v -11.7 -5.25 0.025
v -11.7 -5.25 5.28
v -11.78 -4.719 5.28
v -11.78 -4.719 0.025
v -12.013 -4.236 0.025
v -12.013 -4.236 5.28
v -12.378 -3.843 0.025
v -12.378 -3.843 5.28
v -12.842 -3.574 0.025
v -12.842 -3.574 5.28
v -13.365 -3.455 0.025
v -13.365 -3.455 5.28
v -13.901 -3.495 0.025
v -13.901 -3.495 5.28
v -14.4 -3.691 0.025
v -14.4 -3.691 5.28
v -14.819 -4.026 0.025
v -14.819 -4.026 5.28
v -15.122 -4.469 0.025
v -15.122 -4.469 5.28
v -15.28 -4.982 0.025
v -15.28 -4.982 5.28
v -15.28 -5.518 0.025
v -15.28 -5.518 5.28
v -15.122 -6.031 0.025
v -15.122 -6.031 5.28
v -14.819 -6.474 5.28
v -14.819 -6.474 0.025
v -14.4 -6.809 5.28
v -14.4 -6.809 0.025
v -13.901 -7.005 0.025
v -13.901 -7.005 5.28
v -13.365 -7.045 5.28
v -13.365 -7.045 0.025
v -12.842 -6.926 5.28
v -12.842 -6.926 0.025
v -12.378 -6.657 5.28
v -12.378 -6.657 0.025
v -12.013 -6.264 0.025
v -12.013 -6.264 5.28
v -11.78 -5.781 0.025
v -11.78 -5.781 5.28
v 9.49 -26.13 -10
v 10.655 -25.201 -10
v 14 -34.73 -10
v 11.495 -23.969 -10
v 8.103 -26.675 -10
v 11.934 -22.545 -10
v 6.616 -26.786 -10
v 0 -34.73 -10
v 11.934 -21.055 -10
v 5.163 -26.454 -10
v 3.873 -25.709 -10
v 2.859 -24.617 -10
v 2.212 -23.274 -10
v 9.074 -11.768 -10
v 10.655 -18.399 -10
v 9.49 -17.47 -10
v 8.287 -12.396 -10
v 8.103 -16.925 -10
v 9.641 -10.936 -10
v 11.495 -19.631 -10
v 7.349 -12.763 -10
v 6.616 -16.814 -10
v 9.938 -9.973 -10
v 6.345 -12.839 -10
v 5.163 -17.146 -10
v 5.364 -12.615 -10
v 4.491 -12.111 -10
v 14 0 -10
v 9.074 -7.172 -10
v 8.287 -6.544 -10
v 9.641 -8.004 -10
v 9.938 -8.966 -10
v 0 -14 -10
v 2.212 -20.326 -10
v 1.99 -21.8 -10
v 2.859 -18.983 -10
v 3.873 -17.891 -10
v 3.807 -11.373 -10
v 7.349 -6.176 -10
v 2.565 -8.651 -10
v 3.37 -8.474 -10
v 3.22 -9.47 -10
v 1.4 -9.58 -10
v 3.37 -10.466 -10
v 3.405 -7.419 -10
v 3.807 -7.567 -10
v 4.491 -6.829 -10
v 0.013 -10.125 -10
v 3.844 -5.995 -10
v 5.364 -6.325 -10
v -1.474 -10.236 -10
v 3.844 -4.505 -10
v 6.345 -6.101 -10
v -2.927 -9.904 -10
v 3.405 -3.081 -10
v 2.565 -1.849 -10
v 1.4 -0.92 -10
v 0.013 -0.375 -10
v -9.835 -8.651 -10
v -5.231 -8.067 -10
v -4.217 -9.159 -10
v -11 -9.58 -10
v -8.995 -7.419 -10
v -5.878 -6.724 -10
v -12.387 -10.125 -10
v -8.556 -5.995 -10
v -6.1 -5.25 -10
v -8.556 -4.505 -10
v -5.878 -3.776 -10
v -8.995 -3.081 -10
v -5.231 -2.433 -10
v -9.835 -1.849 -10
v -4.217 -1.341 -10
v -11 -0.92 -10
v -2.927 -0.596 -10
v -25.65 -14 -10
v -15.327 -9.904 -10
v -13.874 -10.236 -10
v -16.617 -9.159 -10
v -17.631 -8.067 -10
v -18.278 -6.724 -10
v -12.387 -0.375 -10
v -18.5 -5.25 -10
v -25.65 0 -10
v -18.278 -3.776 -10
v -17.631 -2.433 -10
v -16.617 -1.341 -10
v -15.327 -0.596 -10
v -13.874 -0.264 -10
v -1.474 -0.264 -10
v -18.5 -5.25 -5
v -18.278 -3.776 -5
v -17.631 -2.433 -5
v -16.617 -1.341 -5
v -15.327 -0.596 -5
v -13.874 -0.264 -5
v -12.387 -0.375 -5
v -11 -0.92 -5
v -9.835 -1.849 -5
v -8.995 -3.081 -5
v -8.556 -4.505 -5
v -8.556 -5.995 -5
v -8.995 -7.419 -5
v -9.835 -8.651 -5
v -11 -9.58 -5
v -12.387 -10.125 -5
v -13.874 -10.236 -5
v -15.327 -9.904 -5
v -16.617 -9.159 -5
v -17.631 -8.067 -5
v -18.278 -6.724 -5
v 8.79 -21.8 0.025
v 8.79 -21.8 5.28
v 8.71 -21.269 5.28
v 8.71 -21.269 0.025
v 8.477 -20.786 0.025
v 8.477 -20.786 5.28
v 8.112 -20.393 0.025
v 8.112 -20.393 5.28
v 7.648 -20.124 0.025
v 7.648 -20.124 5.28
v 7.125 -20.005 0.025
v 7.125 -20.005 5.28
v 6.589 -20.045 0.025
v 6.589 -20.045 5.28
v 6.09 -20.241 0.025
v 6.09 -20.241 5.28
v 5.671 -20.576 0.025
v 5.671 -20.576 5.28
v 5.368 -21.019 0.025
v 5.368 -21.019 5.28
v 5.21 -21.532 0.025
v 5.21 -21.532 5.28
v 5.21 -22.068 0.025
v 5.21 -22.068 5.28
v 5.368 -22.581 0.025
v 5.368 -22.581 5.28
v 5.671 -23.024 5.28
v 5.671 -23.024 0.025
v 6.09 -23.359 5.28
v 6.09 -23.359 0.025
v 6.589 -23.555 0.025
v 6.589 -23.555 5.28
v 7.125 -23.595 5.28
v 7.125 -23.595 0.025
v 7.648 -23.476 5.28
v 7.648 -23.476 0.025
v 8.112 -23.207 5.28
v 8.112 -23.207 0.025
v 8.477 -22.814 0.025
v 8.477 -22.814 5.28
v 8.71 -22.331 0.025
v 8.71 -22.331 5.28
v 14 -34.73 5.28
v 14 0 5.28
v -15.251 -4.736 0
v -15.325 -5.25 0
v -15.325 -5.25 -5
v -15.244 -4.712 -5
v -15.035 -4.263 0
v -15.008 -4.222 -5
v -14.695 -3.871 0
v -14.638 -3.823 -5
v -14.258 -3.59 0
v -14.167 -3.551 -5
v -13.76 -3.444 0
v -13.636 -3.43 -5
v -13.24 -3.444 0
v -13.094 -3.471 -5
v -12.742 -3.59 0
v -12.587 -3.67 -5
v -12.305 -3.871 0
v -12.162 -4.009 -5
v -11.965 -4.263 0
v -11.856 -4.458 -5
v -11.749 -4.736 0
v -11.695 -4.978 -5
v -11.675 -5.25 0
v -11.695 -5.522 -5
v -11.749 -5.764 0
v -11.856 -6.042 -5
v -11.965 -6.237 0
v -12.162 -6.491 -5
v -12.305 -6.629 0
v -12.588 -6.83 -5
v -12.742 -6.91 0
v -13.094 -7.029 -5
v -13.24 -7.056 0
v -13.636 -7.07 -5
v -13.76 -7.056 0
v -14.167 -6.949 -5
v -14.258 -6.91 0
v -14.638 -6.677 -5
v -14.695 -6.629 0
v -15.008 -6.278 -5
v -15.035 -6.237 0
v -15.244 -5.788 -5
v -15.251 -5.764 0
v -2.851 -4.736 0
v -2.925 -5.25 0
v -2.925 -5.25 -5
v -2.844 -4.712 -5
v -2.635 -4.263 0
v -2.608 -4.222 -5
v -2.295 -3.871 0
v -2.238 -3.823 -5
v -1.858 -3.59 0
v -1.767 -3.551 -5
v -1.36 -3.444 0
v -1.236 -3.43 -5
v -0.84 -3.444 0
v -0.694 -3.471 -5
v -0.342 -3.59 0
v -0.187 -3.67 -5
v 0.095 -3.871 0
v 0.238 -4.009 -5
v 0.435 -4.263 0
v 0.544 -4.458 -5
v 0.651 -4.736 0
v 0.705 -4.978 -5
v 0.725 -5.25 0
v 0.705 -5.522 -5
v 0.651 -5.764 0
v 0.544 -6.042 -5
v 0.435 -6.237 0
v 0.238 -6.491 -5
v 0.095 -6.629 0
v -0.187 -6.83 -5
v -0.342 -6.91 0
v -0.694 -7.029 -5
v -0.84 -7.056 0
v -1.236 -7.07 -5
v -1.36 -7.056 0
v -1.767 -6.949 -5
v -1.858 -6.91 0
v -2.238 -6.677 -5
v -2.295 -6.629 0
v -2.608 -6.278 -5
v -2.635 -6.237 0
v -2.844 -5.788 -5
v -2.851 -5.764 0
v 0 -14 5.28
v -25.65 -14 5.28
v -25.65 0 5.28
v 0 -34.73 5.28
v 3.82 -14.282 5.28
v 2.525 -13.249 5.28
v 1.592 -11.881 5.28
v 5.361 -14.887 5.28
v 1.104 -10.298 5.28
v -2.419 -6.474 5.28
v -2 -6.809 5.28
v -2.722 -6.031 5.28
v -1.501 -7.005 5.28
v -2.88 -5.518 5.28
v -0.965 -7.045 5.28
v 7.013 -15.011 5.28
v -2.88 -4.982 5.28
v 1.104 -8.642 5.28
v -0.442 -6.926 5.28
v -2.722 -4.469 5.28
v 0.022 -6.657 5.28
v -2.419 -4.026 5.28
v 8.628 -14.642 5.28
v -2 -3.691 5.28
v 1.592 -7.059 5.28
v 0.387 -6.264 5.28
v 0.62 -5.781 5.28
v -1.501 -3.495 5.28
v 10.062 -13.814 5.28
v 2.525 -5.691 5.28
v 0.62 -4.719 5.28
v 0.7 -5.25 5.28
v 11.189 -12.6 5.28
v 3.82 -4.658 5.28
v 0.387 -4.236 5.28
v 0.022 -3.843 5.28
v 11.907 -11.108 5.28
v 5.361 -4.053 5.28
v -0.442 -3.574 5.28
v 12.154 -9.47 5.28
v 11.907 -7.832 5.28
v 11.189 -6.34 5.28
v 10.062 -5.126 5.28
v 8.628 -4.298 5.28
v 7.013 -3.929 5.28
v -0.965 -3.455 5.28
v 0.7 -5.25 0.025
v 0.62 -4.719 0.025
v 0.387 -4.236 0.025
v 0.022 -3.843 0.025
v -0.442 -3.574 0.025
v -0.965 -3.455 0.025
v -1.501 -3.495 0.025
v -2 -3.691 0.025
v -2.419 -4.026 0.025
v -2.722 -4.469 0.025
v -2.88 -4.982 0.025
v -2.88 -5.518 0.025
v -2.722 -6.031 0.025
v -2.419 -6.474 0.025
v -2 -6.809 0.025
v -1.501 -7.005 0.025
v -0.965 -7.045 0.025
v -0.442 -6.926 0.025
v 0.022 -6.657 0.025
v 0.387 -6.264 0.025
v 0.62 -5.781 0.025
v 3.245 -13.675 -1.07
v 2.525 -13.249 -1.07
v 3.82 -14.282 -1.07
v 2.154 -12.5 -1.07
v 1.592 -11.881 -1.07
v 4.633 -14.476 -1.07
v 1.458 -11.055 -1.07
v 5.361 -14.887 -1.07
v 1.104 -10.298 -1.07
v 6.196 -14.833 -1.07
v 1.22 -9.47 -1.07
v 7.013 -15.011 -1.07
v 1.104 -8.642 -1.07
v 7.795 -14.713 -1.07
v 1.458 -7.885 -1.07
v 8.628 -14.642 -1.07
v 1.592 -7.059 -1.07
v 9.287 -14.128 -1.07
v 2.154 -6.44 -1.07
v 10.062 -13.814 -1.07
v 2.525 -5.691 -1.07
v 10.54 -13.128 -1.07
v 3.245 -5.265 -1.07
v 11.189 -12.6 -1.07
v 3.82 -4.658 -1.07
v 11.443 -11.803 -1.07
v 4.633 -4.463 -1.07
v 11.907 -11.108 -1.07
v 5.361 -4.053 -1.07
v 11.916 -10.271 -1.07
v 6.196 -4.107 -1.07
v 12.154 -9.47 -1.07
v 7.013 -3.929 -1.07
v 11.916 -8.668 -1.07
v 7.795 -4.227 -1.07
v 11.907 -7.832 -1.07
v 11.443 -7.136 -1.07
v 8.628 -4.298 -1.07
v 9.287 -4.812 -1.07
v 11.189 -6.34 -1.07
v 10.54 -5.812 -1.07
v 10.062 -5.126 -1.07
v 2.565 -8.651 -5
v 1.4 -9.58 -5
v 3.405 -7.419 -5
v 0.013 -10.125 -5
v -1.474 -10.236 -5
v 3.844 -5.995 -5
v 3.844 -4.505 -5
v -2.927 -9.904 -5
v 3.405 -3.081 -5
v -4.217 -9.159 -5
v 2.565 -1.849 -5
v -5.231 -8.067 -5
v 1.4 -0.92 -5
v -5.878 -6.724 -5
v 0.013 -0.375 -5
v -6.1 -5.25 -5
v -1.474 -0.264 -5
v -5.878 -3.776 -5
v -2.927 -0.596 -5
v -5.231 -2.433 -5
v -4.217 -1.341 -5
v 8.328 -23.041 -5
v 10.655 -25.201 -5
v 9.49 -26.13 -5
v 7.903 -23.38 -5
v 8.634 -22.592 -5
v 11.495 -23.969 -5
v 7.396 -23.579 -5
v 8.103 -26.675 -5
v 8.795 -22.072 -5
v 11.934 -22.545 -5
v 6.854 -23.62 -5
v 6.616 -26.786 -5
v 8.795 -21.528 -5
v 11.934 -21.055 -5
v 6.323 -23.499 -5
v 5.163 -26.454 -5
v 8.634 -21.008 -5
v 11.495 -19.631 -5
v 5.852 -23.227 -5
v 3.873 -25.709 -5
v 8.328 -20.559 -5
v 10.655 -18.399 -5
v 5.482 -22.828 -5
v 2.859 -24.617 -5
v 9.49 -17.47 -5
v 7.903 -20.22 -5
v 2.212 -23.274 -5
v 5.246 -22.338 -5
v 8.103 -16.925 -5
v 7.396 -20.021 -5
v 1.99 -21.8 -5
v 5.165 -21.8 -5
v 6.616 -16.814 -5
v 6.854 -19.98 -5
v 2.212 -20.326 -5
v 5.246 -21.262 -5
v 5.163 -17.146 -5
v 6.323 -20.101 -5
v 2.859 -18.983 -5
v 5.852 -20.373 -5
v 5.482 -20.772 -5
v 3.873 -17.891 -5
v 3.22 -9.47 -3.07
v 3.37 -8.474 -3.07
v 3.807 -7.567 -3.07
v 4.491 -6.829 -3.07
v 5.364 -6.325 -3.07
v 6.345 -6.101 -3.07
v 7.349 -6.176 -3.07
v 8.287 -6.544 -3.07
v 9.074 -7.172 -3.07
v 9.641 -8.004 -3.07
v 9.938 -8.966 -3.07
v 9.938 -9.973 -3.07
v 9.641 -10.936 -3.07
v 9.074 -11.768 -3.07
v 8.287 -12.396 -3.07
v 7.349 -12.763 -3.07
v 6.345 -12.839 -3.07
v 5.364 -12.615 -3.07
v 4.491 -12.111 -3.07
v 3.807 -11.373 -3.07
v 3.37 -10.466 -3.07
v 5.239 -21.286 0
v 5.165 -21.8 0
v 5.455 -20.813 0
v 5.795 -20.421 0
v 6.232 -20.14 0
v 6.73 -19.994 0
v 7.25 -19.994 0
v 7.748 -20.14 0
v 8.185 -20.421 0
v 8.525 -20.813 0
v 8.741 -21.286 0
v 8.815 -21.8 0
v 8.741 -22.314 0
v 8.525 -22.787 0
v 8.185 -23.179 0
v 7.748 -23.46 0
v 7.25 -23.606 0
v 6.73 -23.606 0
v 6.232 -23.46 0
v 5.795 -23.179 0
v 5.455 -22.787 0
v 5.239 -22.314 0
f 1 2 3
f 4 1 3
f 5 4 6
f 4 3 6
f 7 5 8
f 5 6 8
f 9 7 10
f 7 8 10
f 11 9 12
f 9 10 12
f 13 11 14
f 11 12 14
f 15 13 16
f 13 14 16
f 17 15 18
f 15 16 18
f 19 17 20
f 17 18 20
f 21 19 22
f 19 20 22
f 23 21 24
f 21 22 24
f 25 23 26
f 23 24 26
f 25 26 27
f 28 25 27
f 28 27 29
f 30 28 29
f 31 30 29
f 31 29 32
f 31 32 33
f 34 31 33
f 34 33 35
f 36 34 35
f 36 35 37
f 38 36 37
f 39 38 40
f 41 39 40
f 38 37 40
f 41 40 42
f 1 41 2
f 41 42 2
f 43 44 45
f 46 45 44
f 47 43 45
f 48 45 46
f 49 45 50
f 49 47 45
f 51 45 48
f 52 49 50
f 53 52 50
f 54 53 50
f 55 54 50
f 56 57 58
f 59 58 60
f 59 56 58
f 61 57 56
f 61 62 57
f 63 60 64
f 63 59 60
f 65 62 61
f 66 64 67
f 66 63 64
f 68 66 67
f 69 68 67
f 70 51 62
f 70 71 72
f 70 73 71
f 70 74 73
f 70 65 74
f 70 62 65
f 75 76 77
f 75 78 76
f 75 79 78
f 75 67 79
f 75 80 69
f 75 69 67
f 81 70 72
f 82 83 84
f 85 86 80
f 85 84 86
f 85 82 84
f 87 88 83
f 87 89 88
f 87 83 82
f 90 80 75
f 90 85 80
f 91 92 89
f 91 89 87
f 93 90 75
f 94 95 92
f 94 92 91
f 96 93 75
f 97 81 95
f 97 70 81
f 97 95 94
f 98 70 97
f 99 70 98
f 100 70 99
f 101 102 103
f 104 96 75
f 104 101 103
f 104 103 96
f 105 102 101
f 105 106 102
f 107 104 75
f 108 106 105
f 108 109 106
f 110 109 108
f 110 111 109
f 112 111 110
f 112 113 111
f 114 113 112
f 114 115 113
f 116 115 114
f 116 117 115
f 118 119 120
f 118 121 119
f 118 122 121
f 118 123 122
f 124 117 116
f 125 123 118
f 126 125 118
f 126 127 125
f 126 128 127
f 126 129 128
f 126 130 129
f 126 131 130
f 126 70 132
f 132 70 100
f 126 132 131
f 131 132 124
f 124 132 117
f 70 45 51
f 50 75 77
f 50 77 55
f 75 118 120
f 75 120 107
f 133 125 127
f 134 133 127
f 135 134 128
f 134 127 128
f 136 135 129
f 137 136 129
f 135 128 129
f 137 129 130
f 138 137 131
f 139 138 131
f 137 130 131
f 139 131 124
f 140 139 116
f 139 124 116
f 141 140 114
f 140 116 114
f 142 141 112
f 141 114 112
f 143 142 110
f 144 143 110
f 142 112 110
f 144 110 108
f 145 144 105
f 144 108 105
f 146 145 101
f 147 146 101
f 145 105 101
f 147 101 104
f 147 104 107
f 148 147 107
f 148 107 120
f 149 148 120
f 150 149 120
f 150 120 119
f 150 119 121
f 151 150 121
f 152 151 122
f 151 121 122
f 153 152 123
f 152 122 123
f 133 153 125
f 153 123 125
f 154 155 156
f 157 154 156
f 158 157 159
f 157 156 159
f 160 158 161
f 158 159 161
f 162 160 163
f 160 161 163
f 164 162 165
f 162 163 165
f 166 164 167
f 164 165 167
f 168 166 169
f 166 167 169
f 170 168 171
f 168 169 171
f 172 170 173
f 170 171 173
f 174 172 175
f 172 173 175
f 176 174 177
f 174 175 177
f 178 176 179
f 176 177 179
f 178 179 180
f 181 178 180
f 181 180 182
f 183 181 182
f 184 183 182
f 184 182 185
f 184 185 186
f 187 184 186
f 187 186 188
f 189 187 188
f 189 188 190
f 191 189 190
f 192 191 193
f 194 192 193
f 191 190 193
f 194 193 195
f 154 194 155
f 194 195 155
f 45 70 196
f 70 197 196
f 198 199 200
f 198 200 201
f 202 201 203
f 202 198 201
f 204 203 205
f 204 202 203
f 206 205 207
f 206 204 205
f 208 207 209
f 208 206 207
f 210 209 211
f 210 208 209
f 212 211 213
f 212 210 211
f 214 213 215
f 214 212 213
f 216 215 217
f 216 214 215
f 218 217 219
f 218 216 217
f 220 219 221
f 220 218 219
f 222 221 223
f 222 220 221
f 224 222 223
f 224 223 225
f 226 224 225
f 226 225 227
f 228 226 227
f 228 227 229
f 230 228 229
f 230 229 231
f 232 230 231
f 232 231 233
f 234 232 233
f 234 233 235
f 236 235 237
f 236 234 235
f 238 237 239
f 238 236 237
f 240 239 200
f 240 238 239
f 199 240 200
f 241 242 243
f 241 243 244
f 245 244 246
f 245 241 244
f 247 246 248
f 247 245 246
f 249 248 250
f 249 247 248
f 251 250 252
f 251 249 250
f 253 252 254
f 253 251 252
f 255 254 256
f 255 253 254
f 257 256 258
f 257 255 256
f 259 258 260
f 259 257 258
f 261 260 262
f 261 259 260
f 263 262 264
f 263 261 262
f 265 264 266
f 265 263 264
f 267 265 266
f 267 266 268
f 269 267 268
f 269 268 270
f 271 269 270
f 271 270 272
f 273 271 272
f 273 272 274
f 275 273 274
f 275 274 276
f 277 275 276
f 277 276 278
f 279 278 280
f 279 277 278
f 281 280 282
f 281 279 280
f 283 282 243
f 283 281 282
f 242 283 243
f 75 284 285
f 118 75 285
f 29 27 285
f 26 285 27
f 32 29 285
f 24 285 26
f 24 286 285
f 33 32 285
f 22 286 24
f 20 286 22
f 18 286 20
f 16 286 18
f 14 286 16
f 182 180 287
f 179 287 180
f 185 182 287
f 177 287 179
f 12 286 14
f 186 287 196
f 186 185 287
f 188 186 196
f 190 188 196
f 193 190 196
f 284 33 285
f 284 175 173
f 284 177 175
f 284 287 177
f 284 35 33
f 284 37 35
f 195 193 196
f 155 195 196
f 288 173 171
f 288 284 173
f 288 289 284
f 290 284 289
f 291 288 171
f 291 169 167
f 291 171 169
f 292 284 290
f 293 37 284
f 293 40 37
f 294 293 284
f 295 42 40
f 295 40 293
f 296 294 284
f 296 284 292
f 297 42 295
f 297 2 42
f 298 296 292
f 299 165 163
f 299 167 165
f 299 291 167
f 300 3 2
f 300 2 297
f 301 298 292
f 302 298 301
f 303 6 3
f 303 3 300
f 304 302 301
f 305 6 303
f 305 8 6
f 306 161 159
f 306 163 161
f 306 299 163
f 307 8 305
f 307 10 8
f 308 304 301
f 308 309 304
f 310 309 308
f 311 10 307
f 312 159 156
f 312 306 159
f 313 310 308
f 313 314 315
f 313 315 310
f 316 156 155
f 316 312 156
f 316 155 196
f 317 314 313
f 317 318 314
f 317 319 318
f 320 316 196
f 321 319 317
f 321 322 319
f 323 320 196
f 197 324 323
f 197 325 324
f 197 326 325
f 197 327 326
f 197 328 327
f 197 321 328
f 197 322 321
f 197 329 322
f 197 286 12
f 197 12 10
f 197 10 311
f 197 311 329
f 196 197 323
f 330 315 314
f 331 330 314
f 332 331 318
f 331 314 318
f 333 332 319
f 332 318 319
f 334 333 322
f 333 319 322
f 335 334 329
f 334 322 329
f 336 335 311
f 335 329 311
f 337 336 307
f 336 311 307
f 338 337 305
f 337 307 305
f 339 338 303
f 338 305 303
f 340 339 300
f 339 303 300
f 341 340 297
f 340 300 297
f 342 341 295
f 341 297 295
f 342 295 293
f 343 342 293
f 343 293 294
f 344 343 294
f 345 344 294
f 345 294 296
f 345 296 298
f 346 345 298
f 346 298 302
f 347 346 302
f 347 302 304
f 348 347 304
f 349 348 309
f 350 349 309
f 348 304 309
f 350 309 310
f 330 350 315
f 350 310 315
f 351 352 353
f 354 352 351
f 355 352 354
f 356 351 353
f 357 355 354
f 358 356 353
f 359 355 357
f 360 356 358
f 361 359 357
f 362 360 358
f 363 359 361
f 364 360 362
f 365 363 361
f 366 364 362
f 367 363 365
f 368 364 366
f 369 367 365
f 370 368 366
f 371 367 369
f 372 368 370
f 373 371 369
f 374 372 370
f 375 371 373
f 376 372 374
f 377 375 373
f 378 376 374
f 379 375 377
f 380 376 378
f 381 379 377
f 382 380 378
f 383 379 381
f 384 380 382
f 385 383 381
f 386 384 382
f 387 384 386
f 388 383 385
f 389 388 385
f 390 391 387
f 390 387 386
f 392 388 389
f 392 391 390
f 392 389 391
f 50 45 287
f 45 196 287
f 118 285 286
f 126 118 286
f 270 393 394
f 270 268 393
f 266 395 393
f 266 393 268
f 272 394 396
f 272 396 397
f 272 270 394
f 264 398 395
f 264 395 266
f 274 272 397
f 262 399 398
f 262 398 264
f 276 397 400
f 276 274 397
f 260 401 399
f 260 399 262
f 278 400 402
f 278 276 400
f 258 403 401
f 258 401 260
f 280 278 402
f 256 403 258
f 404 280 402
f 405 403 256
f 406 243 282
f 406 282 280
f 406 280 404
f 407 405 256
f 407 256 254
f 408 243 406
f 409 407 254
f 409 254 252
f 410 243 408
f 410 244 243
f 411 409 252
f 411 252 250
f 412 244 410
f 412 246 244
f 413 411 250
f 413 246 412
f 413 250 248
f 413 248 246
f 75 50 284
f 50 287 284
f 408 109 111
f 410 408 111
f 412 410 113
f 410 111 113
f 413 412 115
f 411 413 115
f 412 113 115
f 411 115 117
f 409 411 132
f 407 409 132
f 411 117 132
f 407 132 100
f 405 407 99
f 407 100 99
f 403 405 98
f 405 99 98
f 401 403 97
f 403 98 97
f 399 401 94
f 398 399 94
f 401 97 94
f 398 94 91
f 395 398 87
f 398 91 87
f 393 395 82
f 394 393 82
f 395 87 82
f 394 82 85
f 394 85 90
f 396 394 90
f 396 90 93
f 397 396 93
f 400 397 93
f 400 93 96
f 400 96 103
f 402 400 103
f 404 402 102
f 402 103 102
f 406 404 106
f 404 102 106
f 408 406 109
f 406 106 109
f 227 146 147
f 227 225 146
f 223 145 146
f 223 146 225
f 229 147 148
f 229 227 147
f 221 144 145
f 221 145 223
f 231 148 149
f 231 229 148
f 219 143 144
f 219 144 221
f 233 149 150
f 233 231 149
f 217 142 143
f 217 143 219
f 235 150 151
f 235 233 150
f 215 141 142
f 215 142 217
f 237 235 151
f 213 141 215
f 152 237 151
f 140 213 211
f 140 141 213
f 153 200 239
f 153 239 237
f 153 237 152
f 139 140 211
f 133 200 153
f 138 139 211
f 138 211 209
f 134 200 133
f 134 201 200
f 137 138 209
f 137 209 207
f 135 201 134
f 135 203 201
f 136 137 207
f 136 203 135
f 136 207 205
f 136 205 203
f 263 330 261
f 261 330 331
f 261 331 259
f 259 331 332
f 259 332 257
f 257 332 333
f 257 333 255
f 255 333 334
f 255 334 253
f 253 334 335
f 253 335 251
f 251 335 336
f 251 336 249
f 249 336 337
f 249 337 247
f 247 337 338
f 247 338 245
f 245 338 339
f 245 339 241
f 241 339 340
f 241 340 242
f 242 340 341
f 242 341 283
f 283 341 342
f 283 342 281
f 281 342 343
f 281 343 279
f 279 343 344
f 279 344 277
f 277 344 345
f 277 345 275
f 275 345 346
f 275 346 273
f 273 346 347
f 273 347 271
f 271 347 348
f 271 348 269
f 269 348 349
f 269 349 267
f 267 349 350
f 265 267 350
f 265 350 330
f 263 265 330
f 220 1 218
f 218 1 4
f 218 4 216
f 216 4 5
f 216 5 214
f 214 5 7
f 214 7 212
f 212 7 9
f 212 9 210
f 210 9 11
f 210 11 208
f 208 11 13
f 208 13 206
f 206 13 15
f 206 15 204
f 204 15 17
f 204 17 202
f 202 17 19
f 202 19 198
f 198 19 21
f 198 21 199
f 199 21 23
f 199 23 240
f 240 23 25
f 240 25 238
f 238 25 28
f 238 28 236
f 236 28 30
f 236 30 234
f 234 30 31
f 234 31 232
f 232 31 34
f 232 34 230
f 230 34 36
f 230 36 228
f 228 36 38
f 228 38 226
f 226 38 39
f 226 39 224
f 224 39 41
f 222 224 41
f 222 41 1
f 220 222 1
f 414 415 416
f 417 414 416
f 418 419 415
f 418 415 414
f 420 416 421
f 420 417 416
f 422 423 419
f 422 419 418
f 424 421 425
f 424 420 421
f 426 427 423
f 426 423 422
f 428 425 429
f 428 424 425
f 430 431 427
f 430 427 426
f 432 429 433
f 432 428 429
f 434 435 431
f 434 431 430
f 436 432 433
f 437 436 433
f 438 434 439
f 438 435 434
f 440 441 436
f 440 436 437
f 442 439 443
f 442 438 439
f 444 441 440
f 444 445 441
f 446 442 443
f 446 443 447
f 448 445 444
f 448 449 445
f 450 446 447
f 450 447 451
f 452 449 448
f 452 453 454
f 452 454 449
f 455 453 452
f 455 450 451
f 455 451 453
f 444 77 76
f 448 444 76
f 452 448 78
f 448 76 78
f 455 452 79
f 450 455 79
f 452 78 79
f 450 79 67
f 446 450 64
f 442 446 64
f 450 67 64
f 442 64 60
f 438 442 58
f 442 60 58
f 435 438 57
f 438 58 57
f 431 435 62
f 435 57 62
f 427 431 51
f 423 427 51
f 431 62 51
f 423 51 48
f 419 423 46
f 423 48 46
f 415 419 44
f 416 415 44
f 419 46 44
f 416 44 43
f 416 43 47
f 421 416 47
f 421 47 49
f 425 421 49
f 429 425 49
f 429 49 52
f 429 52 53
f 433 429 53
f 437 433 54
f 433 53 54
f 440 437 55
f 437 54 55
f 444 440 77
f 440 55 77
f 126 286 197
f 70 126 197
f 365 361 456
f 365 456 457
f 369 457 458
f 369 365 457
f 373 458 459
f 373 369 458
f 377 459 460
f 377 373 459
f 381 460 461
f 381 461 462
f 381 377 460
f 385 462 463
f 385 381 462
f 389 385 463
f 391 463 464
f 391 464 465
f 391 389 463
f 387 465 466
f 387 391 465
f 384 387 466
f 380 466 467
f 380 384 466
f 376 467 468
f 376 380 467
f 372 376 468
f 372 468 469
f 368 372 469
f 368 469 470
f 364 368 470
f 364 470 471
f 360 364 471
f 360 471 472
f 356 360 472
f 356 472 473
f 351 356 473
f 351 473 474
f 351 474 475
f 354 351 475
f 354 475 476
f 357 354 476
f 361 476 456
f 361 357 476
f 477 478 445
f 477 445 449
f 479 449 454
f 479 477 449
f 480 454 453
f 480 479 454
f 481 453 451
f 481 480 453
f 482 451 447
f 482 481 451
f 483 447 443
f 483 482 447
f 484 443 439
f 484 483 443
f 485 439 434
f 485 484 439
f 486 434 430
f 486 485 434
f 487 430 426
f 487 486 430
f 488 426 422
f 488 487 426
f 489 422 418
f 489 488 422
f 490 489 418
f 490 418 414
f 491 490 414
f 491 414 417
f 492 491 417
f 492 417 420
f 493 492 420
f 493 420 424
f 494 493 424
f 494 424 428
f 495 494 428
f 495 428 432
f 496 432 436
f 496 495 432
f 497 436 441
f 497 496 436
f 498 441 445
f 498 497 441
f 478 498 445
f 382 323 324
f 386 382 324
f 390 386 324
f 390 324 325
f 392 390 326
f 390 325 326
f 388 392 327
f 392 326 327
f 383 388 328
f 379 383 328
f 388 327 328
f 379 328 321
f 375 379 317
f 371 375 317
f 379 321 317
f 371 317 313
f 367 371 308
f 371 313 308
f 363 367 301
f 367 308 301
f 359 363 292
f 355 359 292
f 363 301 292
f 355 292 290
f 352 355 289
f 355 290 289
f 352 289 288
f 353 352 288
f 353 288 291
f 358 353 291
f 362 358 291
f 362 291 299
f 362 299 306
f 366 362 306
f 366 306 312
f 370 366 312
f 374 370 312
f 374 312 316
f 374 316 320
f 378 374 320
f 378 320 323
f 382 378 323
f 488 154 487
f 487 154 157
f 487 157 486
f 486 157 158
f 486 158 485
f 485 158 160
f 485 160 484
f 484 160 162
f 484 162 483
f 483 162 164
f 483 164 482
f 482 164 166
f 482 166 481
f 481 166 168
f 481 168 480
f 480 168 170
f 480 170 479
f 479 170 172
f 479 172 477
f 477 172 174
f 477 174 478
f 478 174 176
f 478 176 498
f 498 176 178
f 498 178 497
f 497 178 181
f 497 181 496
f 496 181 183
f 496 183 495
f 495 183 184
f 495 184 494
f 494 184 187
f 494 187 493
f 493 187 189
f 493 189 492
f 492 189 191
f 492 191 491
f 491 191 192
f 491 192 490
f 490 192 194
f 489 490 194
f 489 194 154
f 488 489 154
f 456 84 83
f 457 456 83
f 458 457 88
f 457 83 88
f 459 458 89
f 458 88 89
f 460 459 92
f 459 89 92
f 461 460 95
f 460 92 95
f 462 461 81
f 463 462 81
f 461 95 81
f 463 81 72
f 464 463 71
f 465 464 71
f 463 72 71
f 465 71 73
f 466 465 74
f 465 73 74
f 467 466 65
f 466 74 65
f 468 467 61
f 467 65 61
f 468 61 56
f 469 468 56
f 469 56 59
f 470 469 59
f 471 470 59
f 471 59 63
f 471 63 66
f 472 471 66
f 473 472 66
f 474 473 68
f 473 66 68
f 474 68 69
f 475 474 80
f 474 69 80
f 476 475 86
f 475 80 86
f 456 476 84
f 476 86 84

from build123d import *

# Parameters (mm, degrees)
BOSS_EXTRUDE1_DEPTH                              = 42.65
SKETCH2_R                                        = 6.425
CUT_EXTRUDE1_DEPTH                               = 42.65
SKETCH3_W                                        = 1.9
SKETCH3_H                                        = 30
CUT_EXTRUDE2_DEPTH                               = 42.65
SKETCH4_R                                        = 6.425
CUT_EXTRUDE3_DEPTH                               = 42.65
SKETCH5_W                                        = 32
SKETCH5_H                                        = 1.9
CUT_EXTRUDE4_DEPTH                               = 42.65
M3_CLEARANCE_HOLE1_D                             = 3.6
M3_CLEARANCE_HOLE1_DEPTH                         = 10
M3_CLEARANCE_HOLE1_CSINK_D                       = 3.65
M3_CLEARANCE_HOLE1_CSINK_ANGLE                   = 90
M3_CLEARANCE_HOLE1_TIP                           = 1.081549114
SKETCH9_W                                        = 61.993652624
SKETCH9_H                                        = 40.55348858
CUT_EXTRUDE5_DEPTH                               = 61.688696641
SKETCH10_R                                       = 1.825
BOSS_EXTRUDE2_DEPTH                              = 10
CBORE_FOR_1_4_SOCKET_HEAD_CAP_SCREW1_D           = 6.7564
CBORE_FOR_1_4_SOCKET_HEAD_CAP_SCREW1_CBORE_D     = 11.1125
CBORE_FOR_1_4_SOCKET_HEAD_CAP_SCREW1_CBORE_DEPTH = 6.35
SKETCH14_R                                       = 5
CUT_EXTRUDE6_DEPTH                               = 5
CHAMFER1_SIZE                                    = 2


with BuildPart() as part:
    # Sketch1 → Boss-Extrude1 (new body)
    with BuildSketch(Plane.XY):
        Polygon((14, 0), (-25.65, 0), (-25.65, -14), (0, -14), (0, -34.73), (14, -34.73), align=None)
    extrude(amount=BOSS_EXTRUDE1_DEPTH)

    # Sketch2 → Cut-Extrude1 (cut)
    with BuildSketch(Plane.XZ.offset(14)):
        with Locations((-14.665, 27.725)):
            Circle(SKETCH2_R)
    extrude(amount=-CUT_EXTRUDE1_DEPTH, mode=Mode.SUBTRACT)

    # Sketch3 → Cut-Extrude2 (cut)
    with BuildSketch(Plane.XZ.offset(14)):
        with Locations((-16.7, 27.65)):
            Rectangle(SKETCH3_W, SKETCH3_H)
    extrude(amount=-CUT_EXTRUDE2_DEPTH, mode=Mode.SUBTRACT)

    # Sketch4 → Cut-Extrude3 (cut)
    with BuildSketch(Plane.ZY):
        with Locations((18.725, -21.745)):
            Circle(SKETCH4_R)
    extrude(amount=-CUT_EXTRUDE3_DEPTH, mode=Mode.SUBTRACT)

    # Sketch5 → Cut-Extrude4 (cut)
    with BuildSketch(Plane.ZY):
        with Locations((26.65, -25.78)):
            Rectangle(SKETCH5_W, SKETCH5_H)
    extrude(amount=-CUT_EXTRUDE4_DEPTH, mode=Mode.SUBTRACT)

    # M3 Clearance Hole1
    with Locations(Plane(origin=(0, 0, 0), x_dir=(-1, 0, 0), z_dir=(0, 0, -1))):
        with Locations((1.1, -5.25), (13.5, -5.25), (-6.99, -21.8)):
            CounterSinkHole(M3_CLEARANCE_HOLE1_D / 2, M3_CLEARANCE_HOLE1_CSINK_D / 2, depth=M3_CLEARANCE_HOLE1_DEPTH, counter_sink_angle=M3_CLEARANCE_HOLE1_CSINK_ANGLE)
            with Locations((0, 0, -(M3_CLEARANCE_HOLE1_DEPTH + M3_CLEARANCE_HOLE1_TIP / 2))):  # 118° drill point
                Cone(0, M3_CLEARANCE_HOLE1_D / 2, M3_CLEARANCE_HOLE1_TIP, mode=Mode.SUBTRACT)

    # Sketch9 → Cut-Extrude5 (cut, through all)
    with BuildSketch(Plane(origin=(0, 0, 0), x_dir=(1, 0, 0), z_dir=(0, 1, 0))):
        with Locations((-5.42180131, -25.55674429)):
            Rectangle(SKETCH9_W, SKETCH9_H)
    extrude(amount=-CUT_EXTRUDE5_DEPTH, mode=Mode.SUBTRACT)

    # Sketch10 → Boss-Extrude2 (add)
    with BuildSketch(Plane(origin=(0, 0, 0), x_dir=(-1, 0, 0), z_dir=(0, 0, -1))):
        Polygon((25.65, 0), (-14, 0), (-14, -34.73), (0, -34.73), (0, -14), (25.65, -14), align=None)
        with Locations((1.1, -5.25)):
            Circle(SKETCH10_R, mode=Mode.SUBTRACT)
        with Locations((13.5, -5.25)):
            Circle(SKETCH10_R, mode=Mode.SUBTRACT)
        with Locations((-6.99, -21.8)):
            Circle(SKETCH10_R, mode=Mode.SUBTRACT)
    extrude(amount=BOSS_EXTRUDE2_DEPTH)

    # CBORE for 1/4 Socket Head Cap Screw1 (through all)
    with Locations(Plane.XY.offset(5.28)):
        with Locations((6.597752863, -9.469911877)):
            CounterBoreHole(CBORE_FOR_1_4_SOCKET_HEAD_CAP_SCREW1_D / 2, CBORE_FOR_1_4_SOCKET_HEAD_CAP_SCREW1_CBORE_D / 2, CBORE_FOR_1_4_SOCKET_HEAD_CAP_SCREW1_CBORE_DEPTH)

    # Sketch14 → Cut-Extrude6 (cut)
    with BuildSketch(Plane(origin=(0, 0, -10), x_dir=(-1, 0, 0), z_dir=(0, 0, -1))):
        with Locations((1.1, -5.25)):
            Circle(SKETCH14_R)
        with Locations((13.5, -5.25)):
            Circle(SKETCH14_R)
        with Locations((-6.99, -21.8)):
            Circle(SKETCH14_R)
    extrude(amount=-CUT_EXTRUDE6_DEPTH, mode=Mode.SUBTRACT)

    # Chamfer1
    chamfer1_edges = [part.edges().sort_by_distance(p)[0] for p in [
        (9.975952863, -9.469911877, -1.07),
    ]]
    chamfer(chamfer1_edges, length=CHAMFER1_SIZE)


solid = part.part
